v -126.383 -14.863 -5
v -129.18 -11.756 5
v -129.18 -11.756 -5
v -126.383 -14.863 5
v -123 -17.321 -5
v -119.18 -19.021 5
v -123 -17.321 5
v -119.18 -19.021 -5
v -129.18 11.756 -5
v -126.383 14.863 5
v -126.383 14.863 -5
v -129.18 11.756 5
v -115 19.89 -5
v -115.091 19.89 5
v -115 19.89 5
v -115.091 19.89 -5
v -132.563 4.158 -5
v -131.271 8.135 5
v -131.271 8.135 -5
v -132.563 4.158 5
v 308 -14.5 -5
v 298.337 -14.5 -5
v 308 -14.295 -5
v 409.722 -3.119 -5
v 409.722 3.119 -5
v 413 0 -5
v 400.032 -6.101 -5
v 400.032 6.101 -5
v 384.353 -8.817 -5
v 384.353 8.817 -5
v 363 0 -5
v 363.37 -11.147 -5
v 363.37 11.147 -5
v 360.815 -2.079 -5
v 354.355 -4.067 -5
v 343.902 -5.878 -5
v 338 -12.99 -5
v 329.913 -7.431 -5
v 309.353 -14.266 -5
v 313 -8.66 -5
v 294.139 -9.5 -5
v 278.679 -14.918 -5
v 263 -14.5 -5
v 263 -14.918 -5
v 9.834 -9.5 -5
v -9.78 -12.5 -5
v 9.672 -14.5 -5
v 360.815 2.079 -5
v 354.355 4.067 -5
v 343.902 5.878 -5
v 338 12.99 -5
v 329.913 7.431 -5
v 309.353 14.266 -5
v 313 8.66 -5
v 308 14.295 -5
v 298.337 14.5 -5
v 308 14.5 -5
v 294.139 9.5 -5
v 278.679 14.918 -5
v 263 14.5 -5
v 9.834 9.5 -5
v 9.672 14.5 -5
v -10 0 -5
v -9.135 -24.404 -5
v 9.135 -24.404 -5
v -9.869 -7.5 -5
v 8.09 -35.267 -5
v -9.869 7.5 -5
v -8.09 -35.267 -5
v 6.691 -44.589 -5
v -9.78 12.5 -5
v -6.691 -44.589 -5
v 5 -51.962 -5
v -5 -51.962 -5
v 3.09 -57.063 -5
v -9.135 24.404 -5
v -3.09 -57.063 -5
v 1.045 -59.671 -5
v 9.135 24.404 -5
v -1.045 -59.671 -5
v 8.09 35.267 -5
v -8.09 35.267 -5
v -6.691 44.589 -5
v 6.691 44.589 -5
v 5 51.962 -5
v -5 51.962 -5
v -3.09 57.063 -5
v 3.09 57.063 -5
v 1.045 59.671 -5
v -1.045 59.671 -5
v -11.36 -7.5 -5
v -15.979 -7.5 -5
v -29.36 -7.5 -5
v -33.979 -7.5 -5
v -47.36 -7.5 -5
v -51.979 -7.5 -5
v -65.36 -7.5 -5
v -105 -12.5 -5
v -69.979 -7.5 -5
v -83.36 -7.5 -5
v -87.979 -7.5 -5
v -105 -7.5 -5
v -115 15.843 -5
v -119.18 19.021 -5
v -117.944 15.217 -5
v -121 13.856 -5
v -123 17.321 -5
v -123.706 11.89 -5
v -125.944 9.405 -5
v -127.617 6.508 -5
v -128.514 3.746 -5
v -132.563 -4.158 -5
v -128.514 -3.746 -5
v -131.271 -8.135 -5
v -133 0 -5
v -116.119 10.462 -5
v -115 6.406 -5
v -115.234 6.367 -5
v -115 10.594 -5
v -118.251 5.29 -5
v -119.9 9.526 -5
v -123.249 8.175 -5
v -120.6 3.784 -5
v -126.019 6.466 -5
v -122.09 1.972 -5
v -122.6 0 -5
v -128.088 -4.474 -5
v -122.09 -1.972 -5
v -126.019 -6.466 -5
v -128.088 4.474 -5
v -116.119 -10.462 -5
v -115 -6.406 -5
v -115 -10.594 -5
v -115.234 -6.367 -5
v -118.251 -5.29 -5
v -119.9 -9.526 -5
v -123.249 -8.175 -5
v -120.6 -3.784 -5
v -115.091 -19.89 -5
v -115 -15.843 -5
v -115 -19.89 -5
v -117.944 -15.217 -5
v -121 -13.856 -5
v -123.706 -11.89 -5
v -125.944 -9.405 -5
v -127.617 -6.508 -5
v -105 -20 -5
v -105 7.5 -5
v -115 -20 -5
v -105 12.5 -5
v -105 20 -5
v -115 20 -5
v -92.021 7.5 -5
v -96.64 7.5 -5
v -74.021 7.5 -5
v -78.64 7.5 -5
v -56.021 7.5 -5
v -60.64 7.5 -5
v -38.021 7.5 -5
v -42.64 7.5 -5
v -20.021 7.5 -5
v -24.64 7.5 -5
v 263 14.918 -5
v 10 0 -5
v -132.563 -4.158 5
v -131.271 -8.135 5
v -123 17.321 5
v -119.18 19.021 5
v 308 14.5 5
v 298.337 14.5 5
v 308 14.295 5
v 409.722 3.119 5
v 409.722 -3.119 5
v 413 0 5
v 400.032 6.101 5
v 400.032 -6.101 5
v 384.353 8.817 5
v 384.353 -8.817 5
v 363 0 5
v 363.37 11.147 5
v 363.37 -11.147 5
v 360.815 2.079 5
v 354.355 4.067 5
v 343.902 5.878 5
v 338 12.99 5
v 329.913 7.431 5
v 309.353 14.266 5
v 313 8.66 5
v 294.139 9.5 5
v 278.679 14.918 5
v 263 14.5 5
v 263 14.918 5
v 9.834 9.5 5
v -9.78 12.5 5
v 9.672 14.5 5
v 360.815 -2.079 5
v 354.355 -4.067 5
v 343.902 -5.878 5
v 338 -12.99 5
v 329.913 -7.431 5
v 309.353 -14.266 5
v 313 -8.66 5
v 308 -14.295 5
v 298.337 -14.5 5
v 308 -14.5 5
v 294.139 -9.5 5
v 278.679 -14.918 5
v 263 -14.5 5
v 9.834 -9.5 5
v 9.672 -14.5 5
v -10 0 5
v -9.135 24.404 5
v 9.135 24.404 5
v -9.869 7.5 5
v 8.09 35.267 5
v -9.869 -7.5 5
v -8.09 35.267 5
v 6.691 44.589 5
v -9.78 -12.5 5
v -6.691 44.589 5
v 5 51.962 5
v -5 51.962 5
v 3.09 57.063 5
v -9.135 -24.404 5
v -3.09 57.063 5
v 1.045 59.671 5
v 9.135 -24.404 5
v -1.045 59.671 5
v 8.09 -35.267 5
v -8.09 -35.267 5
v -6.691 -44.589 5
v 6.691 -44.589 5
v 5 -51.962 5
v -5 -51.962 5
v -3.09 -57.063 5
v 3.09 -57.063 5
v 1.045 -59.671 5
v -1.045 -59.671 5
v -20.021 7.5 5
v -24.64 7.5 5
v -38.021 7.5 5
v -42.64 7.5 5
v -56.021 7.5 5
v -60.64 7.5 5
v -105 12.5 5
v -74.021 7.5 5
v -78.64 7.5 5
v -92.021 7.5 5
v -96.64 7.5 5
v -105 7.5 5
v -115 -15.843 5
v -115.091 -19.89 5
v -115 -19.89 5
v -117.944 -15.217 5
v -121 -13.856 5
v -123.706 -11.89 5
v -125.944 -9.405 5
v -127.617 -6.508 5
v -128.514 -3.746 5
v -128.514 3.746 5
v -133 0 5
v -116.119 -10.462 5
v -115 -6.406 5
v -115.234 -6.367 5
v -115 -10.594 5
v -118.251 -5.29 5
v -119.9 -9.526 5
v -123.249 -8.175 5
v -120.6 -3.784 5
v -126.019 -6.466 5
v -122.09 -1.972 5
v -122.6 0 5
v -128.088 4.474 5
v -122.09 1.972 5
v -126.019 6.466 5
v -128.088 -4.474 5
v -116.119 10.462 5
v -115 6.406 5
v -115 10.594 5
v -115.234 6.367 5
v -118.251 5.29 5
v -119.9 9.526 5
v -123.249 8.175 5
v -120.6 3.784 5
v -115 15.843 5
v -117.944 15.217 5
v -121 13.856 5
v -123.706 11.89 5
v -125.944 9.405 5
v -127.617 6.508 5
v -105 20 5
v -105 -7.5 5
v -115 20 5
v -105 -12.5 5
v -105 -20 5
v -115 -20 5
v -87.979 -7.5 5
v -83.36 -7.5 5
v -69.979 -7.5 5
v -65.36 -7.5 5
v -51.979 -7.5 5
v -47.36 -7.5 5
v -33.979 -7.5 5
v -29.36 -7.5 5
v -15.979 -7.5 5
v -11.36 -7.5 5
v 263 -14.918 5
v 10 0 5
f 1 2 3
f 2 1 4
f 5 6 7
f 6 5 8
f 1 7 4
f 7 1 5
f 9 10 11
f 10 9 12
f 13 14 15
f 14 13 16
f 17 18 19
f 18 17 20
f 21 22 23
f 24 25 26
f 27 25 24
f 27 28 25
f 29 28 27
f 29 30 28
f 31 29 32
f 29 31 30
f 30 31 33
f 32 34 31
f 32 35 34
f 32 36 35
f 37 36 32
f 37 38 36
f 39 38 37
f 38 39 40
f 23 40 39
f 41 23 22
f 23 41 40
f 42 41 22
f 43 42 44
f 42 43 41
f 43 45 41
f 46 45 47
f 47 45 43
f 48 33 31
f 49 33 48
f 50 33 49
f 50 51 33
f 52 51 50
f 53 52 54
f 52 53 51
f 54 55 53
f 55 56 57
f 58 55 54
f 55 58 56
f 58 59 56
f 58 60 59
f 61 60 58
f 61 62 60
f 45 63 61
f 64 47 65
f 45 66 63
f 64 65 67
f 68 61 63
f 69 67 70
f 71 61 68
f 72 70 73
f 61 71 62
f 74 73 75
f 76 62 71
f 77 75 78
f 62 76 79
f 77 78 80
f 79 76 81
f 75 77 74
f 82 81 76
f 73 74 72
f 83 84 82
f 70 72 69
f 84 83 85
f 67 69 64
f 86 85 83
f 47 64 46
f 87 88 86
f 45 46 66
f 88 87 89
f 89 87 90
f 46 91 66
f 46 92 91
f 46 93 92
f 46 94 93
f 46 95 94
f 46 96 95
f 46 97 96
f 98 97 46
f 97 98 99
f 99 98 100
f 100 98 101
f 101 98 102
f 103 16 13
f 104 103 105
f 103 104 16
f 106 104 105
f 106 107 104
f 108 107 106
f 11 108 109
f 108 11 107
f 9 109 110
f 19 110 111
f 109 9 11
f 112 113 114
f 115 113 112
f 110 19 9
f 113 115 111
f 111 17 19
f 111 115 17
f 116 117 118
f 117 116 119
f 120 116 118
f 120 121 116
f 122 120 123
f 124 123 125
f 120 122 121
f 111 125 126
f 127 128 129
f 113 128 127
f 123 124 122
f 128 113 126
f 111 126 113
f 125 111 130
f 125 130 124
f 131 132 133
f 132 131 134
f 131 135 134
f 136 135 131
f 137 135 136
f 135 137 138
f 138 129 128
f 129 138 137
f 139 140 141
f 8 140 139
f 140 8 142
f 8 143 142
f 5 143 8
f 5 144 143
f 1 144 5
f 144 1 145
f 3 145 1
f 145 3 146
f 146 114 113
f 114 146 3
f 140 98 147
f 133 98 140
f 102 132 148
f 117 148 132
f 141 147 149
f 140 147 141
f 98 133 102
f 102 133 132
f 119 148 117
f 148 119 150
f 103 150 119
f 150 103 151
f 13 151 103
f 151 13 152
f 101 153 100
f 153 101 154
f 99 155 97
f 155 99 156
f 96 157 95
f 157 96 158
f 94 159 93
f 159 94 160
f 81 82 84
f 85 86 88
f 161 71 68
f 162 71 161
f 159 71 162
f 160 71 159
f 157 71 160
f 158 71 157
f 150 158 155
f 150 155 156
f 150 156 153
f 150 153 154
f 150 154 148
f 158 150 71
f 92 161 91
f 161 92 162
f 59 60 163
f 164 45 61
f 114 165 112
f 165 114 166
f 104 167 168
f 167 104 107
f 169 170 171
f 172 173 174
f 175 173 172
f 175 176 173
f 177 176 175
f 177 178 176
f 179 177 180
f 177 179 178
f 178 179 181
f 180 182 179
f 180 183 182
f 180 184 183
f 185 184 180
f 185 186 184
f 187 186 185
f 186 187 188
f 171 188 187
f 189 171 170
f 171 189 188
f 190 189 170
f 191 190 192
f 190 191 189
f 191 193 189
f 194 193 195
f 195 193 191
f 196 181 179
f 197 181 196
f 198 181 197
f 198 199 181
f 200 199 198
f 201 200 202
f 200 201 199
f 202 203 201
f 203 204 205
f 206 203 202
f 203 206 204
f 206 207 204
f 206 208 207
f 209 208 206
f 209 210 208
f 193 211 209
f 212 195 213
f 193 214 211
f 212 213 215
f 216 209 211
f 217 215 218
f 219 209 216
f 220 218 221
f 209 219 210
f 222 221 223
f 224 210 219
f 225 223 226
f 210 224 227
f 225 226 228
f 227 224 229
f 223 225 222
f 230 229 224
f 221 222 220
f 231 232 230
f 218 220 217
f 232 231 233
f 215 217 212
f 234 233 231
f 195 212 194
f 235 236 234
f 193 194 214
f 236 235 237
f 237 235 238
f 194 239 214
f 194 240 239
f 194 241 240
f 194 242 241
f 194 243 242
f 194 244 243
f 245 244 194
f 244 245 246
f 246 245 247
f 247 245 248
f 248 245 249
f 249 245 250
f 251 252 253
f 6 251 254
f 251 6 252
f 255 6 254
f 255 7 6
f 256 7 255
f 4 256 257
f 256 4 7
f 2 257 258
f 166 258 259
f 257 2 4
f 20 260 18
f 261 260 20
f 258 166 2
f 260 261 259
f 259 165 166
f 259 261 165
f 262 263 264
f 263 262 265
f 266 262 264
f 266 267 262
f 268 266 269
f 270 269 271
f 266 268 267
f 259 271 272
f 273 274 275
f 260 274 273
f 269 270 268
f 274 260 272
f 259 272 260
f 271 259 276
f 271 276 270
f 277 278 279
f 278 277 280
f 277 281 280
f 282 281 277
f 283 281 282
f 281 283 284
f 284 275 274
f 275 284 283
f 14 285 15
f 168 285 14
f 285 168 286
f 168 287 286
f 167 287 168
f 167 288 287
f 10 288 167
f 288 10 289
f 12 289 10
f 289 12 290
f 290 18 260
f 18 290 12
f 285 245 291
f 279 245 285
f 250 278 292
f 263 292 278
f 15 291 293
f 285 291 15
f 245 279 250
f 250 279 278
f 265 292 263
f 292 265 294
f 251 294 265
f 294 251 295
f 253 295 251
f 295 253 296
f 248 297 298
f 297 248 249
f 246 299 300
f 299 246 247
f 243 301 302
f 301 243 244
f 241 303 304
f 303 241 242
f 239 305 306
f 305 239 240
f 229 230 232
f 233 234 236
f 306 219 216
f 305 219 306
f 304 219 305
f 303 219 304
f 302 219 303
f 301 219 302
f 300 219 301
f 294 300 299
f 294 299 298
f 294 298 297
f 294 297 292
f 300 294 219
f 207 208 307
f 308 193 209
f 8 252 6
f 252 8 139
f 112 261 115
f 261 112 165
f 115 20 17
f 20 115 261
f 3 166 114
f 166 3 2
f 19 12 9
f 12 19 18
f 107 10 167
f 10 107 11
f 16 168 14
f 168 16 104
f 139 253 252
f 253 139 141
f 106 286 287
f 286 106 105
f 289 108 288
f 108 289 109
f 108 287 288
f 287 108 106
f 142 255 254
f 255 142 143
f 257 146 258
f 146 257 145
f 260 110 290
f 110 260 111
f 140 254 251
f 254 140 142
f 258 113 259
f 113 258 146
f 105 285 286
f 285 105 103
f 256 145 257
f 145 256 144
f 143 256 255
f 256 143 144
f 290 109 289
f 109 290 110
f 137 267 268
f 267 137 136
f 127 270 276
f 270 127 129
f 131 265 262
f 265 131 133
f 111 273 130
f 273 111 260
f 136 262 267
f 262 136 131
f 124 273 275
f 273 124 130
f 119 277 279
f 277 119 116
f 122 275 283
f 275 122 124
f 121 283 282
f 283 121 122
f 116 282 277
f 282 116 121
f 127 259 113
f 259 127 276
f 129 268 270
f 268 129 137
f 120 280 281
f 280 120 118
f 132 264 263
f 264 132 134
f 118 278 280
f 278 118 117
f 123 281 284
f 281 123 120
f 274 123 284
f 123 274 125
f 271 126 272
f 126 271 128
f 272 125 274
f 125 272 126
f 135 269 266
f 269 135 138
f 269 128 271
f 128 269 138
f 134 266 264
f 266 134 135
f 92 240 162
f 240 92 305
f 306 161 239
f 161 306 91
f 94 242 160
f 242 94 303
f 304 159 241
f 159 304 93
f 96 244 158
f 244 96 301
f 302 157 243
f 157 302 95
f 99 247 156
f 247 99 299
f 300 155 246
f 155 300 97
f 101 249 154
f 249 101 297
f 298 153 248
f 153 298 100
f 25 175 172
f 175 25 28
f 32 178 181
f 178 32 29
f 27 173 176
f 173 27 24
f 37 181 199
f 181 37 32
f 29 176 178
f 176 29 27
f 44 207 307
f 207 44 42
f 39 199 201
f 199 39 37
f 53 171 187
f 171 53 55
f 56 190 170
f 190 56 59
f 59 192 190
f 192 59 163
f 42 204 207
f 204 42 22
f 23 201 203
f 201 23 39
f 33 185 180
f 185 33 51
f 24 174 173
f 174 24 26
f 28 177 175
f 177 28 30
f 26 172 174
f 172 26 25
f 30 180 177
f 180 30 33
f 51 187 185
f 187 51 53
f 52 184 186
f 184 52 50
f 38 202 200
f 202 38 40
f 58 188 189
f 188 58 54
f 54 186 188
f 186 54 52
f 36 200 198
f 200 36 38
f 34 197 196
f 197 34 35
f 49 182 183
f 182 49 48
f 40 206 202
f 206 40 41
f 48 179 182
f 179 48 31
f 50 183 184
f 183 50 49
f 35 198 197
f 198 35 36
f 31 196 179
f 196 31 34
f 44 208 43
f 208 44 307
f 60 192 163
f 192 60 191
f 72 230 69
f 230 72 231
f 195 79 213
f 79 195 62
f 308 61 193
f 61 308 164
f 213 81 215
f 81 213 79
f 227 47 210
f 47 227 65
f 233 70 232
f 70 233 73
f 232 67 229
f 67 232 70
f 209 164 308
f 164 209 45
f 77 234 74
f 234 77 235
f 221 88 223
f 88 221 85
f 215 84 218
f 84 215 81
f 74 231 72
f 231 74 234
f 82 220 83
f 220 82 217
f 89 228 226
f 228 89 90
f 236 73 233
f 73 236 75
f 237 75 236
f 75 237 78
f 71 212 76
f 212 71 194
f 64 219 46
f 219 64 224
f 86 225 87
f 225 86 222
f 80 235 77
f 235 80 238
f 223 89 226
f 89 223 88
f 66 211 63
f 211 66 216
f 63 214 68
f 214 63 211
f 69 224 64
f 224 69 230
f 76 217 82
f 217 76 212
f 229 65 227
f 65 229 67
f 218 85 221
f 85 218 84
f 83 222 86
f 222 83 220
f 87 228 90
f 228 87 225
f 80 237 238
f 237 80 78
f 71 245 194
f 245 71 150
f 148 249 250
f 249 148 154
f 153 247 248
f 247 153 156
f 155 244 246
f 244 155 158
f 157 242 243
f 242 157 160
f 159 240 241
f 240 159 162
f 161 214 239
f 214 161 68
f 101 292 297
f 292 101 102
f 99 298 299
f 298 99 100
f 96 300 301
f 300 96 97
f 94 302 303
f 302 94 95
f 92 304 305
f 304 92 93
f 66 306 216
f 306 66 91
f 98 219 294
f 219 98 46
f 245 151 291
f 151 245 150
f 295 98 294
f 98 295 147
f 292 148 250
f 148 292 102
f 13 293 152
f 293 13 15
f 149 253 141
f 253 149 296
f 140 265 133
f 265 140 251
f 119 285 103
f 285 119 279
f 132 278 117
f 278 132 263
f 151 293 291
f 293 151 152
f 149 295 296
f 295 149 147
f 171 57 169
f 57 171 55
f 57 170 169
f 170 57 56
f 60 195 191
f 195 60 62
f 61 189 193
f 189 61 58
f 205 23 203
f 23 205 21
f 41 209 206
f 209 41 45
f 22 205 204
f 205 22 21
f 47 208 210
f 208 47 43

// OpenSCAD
module efes(h){
multmatrix(m = [ [1, 0, 0, 0],
                 [0, 6, 0, 0],
                 [0, 0, 1, 0],
                 [0, 0, 0,  1]
               ]) cylinder(h=h, r=10, center=true);
}
module ring(r,t,h){
	difference(){
		cylinder(h=h, r=r, center=true);
		cylinder(h=h, r=r-t, center=true);
		translate([r/2,0,0]) cube([r,2*r,h], center=true);
	}
}

module arc(r,t, w){
	multmatrix(m = [ [w, 0, 0, 0],
                 [0, 1, 0, 0],
                 [0, 0, 1, 0],
                 [0, 0, 0,  1]
               ])
	difference(){
		ring(r,t,10)
		color("red") translate([r/2,0,0]) cube([r,2*r,10], center=true);
	}

}
efes(10);
translate([-59,10,0])
cube([100,5,10], center=true);

translate([-59,-10,0])
cube([100,5,10], center=true);

translate([-113,0,0]) arc(20,4,1);

translate([-110,0,0]) cube([10,40,10], center=true);

translate([-110,0,0]) arc(11,4,1.8);

for (i = [1:5]) { 
	translate([-(i*18),0,0]) rotate ([0,0,30])  cube([4,21,10], center=true);
}
translate([158,12,0]) cube([300,5,10], center=true);
translate([158,-12,0]) cube([300,5,10], center=true);
translate([263,0,0]) rotate ([0,0,180]) arc(15,5,10);
